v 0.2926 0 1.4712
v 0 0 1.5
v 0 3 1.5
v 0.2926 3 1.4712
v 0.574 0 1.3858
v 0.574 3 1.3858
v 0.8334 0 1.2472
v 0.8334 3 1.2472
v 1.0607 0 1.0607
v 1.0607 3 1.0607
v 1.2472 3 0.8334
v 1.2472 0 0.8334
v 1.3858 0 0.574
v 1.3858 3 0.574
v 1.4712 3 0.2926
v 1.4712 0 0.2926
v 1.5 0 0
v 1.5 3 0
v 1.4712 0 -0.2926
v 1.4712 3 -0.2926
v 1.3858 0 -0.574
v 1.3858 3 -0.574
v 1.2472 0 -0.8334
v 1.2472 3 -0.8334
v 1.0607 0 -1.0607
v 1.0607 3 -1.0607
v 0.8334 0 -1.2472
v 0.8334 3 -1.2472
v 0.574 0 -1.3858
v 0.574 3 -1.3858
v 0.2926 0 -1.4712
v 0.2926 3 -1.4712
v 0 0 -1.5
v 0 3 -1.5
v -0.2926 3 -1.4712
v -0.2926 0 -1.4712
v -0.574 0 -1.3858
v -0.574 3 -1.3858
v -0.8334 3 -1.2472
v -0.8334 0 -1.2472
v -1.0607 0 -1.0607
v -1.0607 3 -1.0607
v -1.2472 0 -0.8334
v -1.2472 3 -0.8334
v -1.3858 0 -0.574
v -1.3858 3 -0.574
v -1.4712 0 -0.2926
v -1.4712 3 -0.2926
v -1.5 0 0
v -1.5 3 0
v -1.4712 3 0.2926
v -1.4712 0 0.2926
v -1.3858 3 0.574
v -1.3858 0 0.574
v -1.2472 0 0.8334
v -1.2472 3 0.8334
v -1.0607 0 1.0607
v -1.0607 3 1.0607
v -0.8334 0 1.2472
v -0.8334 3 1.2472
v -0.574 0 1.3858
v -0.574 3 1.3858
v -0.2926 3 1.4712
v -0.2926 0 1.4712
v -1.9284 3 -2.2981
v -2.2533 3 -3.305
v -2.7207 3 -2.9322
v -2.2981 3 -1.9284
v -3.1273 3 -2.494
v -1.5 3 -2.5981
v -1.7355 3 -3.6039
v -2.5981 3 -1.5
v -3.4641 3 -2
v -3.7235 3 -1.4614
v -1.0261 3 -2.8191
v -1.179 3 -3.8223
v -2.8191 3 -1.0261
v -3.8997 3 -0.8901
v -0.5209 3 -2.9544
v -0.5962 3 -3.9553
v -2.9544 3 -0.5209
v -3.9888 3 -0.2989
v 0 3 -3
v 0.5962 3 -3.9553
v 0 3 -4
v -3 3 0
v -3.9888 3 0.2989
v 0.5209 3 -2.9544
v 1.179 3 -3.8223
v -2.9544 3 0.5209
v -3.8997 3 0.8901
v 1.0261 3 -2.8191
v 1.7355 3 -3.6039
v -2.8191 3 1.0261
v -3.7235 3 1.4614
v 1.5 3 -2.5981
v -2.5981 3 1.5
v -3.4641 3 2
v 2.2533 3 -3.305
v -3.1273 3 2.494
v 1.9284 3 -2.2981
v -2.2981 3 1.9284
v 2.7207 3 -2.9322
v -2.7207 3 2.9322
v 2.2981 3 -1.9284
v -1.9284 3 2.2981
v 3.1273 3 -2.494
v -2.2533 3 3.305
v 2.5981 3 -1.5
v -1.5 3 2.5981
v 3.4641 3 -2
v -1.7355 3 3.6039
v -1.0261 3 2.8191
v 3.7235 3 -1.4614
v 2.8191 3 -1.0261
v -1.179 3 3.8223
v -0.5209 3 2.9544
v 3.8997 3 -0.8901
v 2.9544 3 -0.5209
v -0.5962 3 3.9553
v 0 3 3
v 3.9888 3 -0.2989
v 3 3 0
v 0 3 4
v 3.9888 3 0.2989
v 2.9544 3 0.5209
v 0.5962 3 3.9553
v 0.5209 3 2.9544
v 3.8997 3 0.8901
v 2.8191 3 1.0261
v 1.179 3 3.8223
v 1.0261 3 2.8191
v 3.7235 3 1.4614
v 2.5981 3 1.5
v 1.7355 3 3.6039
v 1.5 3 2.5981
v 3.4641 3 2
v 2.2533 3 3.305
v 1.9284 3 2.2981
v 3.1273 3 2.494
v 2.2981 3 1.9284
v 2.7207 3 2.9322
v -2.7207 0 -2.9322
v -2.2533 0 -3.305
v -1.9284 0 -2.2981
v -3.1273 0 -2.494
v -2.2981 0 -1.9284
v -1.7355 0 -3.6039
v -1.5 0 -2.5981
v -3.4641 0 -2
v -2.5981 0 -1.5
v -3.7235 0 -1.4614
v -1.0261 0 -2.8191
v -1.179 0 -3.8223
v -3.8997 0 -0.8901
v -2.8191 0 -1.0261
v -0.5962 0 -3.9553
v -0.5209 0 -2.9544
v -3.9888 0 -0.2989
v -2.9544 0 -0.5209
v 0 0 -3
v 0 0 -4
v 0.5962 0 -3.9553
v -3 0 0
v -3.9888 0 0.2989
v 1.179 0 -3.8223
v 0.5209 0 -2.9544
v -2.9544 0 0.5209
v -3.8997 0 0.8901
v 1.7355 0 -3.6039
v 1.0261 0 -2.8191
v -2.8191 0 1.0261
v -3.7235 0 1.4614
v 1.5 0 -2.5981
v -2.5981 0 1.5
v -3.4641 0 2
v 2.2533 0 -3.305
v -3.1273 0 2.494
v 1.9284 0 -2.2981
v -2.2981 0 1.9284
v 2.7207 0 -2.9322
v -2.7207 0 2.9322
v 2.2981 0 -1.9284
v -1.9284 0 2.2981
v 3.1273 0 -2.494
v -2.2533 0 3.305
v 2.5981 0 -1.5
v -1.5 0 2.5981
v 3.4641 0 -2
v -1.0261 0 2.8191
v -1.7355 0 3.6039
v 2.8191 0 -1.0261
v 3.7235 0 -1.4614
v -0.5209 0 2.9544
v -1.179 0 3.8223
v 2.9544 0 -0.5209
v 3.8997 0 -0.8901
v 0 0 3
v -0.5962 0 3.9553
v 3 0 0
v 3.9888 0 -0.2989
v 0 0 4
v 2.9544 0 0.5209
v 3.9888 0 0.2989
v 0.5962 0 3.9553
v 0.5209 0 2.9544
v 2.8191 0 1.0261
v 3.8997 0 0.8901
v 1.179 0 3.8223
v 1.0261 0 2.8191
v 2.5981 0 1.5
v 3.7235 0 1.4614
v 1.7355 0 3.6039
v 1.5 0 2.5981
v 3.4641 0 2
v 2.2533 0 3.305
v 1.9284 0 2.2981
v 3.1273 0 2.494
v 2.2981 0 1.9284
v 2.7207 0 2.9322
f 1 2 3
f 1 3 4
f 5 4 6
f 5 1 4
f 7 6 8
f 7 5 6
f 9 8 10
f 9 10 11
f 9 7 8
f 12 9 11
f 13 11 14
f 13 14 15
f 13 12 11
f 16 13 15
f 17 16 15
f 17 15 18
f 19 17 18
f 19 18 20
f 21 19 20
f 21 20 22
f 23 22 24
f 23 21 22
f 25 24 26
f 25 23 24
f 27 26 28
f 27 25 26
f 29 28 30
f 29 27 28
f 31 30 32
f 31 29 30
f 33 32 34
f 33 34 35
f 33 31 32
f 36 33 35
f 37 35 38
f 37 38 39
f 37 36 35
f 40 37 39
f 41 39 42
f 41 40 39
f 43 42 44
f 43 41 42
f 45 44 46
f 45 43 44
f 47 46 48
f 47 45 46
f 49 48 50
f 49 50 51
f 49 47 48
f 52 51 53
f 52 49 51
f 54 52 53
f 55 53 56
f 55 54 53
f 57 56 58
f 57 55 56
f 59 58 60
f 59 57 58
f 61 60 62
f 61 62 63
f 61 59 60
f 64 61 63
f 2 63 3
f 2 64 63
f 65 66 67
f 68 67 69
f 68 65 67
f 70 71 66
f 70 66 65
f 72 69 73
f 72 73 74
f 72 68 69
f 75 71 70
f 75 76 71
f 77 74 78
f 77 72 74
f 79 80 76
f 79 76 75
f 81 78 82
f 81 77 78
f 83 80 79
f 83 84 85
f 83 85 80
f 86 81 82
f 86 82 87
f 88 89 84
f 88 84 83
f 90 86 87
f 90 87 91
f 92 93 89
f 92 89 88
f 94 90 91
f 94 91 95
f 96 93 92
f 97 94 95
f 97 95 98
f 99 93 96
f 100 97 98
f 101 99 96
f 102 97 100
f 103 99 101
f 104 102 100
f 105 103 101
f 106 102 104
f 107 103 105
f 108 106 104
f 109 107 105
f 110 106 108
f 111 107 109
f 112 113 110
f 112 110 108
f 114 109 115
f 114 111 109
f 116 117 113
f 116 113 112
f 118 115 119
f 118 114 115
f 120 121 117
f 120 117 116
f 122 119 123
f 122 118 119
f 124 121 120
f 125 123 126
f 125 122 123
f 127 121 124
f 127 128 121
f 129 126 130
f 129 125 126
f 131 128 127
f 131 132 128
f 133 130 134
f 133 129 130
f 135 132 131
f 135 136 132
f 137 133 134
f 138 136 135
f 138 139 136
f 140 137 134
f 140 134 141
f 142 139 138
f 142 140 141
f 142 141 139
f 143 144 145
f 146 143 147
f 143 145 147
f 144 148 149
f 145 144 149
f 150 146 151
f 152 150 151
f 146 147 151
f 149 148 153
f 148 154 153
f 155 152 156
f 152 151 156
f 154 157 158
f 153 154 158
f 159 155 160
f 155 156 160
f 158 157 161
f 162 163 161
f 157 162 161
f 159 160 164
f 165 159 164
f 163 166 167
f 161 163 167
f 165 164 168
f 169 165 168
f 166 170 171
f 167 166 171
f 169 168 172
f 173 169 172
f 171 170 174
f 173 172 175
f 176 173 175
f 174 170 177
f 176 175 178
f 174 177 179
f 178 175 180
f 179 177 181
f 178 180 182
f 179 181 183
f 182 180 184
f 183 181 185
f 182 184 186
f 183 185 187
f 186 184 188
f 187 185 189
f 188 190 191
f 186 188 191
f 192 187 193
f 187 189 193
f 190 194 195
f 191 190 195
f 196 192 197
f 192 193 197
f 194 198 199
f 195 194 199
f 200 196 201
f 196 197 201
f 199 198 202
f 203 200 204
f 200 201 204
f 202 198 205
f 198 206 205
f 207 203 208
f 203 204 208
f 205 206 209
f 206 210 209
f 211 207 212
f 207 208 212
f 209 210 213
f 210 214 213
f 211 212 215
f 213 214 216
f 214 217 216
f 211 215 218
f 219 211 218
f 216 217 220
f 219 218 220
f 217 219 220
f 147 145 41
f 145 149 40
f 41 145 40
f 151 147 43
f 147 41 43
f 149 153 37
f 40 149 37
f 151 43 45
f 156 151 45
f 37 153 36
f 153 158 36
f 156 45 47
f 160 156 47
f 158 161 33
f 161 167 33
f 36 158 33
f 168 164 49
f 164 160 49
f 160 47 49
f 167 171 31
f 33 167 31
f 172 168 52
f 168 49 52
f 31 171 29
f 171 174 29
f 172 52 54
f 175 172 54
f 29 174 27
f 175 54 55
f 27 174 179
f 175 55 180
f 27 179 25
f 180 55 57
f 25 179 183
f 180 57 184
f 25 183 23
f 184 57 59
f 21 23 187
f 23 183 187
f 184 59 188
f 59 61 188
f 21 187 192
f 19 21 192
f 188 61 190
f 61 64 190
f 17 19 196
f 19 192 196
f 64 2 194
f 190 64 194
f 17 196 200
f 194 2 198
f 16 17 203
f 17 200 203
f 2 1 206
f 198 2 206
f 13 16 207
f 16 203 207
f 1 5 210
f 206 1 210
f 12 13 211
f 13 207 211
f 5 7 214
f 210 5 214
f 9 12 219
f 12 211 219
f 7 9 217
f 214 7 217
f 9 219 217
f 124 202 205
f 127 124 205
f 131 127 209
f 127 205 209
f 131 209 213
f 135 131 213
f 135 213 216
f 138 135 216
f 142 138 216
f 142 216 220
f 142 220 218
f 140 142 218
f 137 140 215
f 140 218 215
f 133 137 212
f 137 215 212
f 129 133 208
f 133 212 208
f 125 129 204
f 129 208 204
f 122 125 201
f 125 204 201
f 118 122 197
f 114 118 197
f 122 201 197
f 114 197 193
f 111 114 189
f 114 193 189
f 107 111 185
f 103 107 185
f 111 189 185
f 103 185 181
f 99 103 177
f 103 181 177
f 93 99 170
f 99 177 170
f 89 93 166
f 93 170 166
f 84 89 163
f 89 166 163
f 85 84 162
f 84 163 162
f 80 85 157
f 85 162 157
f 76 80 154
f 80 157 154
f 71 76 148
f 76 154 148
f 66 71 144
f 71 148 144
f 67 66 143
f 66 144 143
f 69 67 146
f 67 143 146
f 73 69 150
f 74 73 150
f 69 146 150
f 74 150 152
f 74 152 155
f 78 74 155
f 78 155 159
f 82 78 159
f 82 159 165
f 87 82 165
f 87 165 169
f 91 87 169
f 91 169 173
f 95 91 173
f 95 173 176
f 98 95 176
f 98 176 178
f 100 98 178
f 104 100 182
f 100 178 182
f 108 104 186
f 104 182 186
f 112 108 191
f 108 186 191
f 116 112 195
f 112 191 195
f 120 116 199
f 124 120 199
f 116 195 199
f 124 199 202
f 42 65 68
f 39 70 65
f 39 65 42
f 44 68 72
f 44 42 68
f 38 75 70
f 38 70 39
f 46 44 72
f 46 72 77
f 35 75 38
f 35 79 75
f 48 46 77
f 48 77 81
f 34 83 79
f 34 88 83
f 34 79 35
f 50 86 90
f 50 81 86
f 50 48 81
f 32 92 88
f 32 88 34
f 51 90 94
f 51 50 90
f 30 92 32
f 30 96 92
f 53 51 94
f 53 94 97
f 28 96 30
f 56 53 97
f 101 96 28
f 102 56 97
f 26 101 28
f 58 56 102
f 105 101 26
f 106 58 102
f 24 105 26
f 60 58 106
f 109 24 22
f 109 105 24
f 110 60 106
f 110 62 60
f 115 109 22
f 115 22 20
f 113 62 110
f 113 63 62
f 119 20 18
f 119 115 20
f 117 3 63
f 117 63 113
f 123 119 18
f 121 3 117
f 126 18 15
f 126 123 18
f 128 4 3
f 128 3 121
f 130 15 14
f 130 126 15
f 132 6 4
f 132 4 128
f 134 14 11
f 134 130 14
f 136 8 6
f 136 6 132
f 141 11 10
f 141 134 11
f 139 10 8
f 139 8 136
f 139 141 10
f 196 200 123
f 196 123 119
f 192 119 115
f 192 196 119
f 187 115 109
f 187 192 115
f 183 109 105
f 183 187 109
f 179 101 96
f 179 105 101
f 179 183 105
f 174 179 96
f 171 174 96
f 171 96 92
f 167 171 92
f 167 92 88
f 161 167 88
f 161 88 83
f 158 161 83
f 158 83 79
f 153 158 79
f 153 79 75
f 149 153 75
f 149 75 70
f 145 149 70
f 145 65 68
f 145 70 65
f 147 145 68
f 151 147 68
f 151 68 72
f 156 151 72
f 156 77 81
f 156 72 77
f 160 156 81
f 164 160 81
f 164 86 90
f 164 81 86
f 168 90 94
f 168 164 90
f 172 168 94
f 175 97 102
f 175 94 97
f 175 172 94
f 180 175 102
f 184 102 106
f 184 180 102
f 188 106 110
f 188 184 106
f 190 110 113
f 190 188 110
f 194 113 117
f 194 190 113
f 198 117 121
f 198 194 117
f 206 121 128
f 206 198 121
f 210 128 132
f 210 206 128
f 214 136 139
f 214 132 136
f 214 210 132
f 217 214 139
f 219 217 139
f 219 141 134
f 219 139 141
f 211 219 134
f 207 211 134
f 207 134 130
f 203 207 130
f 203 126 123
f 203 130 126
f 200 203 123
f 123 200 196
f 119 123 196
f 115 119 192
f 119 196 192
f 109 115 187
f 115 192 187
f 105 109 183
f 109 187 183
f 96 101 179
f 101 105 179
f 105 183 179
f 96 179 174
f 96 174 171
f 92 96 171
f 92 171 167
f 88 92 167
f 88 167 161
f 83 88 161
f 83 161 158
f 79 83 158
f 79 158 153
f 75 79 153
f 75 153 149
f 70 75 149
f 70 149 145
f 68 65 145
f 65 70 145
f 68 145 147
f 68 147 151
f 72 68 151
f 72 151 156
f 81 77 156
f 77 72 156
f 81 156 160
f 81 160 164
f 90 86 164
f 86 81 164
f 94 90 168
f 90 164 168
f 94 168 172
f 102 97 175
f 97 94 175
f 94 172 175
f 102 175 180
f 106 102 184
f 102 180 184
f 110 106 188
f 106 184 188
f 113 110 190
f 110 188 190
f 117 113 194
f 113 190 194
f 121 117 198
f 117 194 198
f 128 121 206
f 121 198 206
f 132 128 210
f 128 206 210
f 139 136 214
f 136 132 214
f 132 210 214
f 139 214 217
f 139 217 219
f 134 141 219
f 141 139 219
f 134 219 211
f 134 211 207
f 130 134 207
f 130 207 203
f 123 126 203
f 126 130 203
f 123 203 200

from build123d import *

# Parameters (mm, degrees)
SKETCH_1_R                     = 4
SKETCH_1_R_2                   = 1.5
EXTRUDE_1_DEPTH                = 3
SPLIT_BODIES_1_SURFACE_1_BACK  = 12.705
SPLIT_BODIES_1_SURFACE_1_DEPTH = 25.41
SPLIT_BODIES_1_SURFACE_2_BACK  = 12.705
SPLIT_BODIES_1_SURFACE_2_DEPTH = 25.41


with BuildPart() as part:
    # 草图1 → 凸台-拉伸1 (new body)
    with BuildSketch(Plane(origin=(0, 0, 0), x_dir=(1, 0, 0), z_dir=(0, 1, 0))):
        with Locations(Location((0, 0, 0), (0, 0, 270))):
            Circle(SKETCH_1_R)
        with Locations(Location((0, 0, 0), (0, 0, 270))):
            Circle(SKETCH_1_R_2, mode=Mode.SUBTRACT)
    extrude(amount=EXTRUDE_1_DEPTH)


with BuildPart() as body_2:
    # Split Bodies 1: the piece behind the surface
    add(part.part)
    # Split Bodies 1 surface: a surface, the sketch's curves swept straight by 25.41 mm
    with BuildLine(Plane(origin=(0, 3, 0), x_dir=(1, 0, 0), z_dir=(0, 1, 0)).offset(-SPLIT_BODIES_1_SURFACE_1_BACK), mode=Mode.PRIVATE) as split_bodies_1_surface_1_path:
        CenterArc((0, 0), 3, 0, 360)
    split_bodies_1_surface_1 = Shell.extrude(split_bodies_1_surface_1_path.wire(), (0 * SPLIT_BODIES_1_SURFACE_1_DEPTH, 1 * SPLIT_BODIES_1_SURFACE_1_DEPTH, 0 * SPLIT_BODIES_1_SURFACE_1_DEPTH))
    split(bisect_by=split_bodies_1_surface_1, keep=Keep.BOTTOM)


with BuildPart() as part_1:
    add(part.part)

    # Split Bodies 1: split by a surface, the side it looks to stays
    # Split Bodies 1 surface: a surface, the sketch's curves swept straight by 25.41 mm
    with BuildLine(Plane(origin=(0, 3, 0), x_dir=(1, 0, 0), z_dir=(0, 1, 0)).offset(-SPLIT_BODIES_1_SURFACE_2_BACK), mode=Mode.PRIVATE) as split_bodies_1_surface_2_path:
        CenterArc((0, 0), 3, 0, 360)
    split_bodies_1_surface_2 = Shell.extrude(split_bodies_1_surface_2_path.wire(), (0 * SPLIT_BODIES_1_SURFACE_2_DEPTH, 1 * SPLIT_BODIES_1_SURFACE_2_DEPTH, 0 * SPLIT_BODIES_1_SURFACE_2_DEPTH))
    split(bisect_by=split_bodies_1_surface_2, keep=Keep.TOP)


solid = Compound([body_2.part, part_1.part])
